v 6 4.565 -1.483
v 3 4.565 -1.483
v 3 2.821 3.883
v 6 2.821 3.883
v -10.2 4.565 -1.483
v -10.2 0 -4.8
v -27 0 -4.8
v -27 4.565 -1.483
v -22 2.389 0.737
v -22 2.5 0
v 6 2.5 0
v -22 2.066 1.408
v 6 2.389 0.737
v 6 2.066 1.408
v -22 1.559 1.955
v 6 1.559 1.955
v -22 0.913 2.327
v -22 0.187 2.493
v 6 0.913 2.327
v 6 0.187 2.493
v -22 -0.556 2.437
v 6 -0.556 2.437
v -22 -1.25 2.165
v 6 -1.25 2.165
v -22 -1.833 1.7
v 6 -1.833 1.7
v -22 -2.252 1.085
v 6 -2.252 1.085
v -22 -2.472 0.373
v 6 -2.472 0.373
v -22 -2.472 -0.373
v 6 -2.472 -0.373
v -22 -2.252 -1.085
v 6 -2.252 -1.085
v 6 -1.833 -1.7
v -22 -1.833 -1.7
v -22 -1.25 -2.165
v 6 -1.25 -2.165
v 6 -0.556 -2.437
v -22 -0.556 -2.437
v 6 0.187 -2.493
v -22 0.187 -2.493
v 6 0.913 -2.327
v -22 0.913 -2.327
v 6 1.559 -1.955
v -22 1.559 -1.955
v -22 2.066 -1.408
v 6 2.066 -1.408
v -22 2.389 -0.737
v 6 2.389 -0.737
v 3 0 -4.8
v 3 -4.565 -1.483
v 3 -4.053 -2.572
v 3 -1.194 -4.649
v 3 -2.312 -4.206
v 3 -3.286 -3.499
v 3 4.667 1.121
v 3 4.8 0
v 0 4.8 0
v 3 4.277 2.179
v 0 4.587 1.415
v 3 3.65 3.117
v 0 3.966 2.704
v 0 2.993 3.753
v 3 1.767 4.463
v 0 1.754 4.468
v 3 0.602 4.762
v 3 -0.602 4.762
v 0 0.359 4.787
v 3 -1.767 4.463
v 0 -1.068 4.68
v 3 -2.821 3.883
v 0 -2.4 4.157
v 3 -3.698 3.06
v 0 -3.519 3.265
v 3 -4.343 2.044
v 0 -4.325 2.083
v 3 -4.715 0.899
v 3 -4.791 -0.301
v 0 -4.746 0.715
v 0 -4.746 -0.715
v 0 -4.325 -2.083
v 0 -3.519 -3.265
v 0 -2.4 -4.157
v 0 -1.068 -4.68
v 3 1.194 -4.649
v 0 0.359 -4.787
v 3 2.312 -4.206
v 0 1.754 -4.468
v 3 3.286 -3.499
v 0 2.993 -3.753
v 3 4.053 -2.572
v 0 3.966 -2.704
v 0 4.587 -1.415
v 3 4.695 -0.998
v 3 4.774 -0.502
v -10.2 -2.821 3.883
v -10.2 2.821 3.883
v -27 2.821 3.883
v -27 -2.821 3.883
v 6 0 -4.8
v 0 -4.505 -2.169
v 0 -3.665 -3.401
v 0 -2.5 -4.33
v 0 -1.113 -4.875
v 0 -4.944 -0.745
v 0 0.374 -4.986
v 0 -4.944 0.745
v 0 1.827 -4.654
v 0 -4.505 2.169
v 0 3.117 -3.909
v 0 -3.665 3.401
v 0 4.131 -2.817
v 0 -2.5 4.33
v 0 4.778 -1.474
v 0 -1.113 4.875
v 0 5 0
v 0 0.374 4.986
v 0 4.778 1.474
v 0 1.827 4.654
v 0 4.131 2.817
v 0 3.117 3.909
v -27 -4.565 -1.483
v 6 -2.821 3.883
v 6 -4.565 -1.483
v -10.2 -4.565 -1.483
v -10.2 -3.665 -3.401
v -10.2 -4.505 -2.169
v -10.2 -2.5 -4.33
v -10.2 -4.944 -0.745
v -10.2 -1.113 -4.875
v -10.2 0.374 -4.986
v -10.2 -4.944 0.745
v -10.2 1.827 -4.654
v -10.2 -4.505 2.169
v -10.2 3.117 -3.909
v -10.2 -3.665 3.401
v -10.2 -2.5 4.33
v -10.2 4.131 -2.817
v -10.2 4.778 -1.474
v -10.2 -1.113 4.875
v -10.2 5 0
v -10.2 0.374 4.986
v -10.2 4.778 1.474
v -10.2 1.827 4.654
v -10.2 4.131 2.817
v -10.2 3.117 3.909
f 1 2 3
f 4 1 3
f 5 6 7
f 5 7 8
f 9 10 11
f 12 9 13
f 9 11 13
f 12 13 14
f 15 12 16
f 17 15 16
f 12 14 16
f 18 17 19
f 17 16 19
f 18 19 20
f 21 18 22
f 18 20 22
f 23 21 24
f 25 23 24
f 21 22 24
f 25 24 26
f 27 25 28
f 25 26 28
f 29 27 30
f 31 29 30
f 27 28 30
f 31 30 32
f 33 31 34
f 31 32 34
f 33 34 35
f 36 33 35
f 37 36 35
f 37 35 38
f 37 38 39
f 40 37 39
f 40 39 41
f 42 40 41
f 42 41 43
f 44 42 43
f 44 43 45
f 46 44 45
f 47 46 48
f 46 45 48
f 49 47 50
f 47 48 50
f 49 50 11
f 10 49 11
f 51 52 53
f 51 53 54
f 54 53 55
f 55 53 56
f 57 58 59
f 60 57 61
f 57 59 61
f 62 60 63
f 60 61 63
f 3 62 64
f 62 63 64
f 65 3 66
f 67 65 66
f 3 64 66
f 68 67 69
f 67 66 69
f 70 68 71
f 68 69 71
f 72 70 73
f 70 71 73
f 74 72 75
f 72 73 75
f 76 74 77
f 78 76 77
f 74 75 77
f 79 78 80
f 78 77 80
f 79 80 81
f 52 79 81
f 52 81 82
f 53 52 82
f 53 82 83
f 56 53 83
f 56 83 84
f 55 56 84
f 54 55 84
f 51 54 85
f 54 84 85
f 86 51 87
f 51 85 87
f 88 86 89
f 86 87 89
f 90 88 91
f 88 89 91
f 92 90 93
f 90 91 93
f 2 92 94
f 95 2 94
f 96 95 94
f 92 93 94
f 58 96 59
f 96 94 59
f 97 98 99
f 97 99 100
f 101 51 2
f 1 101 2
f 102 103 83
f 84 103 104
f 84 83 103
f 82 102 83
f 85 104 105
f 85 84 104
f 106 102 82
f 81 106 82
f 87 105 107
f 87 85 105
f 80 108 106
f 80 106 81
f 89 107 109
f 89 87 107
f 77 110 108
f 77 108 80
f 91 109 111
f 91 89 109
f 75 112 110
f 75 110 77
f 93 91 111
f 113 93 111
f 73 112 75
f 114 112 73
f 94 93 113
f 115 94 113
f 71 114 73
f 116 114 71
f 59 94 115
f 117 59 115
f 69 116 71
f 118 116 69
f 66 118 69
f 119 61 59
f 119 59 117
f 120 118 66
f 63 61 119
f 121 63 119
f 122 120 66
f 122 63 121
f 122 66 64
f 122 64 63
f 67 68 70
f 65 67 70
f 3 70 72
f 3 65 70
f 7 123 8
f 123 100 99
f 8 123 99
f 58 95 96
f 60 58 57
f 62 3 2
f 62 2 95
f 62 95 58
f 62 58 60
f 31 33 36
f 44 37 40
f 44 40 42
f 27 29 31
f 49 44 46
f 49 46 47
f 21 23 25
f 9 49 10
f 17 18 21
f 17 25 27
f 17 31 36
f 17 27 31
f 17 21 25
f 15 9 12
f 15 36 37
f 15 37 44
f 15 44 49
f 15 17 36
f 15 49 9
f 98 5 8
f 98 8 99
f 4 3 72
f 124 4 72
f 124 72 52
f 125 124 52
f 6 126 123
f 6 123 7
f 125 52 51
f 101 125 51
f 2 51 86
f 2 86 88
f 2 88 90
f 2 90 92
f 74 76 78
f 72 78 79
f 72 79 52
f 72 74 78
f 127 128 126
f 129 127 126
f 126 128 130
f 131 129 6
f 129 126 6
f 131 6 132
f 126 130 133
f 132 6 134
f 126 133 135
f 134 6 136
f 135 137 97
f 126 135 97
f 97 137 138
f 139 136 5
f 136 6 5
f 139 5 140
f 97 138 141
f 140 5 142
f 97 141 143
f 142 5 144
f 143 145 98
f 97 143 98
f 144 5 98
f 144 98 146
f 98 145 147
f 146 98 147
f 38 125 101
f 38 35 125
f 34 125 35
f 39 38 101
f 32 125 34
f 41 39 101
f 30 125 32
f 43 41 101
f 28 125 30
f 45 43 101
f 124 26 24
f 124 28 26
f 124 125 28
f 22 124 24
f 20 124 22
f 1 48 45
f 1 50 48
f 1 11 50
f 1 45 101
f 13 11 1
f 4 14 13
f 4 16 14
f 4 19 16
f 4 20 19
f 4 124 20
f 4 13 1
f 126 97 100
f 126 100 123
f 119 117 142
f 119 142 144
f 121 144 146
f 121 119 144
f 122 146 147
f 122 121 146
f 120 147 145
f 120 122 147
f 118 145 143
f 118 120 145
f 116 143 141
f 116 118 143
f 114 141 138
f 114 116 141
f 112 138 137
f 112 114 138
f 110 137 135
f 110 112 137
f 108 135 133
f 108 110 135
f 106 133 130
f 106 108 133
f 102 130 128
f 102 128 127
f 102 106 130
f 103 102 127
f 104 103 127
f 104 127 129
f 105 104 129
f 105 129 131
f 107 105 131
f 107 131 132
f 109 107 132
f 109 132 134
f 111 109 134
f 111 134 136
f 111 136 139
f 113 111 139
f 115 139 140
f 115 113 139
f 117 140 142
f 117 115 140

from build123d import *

# Parameters (mm, degrees)
F0_R          = 5
F1_DEPTH      = 10.2
F2_R          = 4.8
F3_DEPTH      = 3
F5_DEPTH      = 3
F5_DEPTH_BACK = 30
F6_R          = 2.5
F7_DEPTH      = 28


with BuildPart() as f1:
    # F0 (on Right) → F1 (new body)
    with BuildSketch(Plane.YZ):
        Circle(F0_R)
    extrude(amount=-F1_DEPTH)

    # F2 (on face) → F3 (join)
    with BuildSketch(Plane.YZ):
        Circle(F2_R)
    extrude(amount=F3_DEPTH)

    # F4 (on face) → F5 (join, two sides)
    with BuildSketch(Plane.YZ.offset(3)) as f5_sk:
        Polygon((-4.565071, -1.483282), (0, -4.8), (4.565071, -1.483282), (2.821369, 3.883282), (-2.821369, 3.883282), align=None)
    extrude(amount=F5_DEPTH)
    extrude(f5_sk.sketch, amount=-F5_DEPTH_BACK)

    # F6 (on face) → F7 (cut)
    with BuildSketch(Plane.YZ.offset(6)):
        Circle(F6_R)
    extrude(amount=-F7_DEPTH, mode=Mode.SUBTRACT)


solid = f1.part
